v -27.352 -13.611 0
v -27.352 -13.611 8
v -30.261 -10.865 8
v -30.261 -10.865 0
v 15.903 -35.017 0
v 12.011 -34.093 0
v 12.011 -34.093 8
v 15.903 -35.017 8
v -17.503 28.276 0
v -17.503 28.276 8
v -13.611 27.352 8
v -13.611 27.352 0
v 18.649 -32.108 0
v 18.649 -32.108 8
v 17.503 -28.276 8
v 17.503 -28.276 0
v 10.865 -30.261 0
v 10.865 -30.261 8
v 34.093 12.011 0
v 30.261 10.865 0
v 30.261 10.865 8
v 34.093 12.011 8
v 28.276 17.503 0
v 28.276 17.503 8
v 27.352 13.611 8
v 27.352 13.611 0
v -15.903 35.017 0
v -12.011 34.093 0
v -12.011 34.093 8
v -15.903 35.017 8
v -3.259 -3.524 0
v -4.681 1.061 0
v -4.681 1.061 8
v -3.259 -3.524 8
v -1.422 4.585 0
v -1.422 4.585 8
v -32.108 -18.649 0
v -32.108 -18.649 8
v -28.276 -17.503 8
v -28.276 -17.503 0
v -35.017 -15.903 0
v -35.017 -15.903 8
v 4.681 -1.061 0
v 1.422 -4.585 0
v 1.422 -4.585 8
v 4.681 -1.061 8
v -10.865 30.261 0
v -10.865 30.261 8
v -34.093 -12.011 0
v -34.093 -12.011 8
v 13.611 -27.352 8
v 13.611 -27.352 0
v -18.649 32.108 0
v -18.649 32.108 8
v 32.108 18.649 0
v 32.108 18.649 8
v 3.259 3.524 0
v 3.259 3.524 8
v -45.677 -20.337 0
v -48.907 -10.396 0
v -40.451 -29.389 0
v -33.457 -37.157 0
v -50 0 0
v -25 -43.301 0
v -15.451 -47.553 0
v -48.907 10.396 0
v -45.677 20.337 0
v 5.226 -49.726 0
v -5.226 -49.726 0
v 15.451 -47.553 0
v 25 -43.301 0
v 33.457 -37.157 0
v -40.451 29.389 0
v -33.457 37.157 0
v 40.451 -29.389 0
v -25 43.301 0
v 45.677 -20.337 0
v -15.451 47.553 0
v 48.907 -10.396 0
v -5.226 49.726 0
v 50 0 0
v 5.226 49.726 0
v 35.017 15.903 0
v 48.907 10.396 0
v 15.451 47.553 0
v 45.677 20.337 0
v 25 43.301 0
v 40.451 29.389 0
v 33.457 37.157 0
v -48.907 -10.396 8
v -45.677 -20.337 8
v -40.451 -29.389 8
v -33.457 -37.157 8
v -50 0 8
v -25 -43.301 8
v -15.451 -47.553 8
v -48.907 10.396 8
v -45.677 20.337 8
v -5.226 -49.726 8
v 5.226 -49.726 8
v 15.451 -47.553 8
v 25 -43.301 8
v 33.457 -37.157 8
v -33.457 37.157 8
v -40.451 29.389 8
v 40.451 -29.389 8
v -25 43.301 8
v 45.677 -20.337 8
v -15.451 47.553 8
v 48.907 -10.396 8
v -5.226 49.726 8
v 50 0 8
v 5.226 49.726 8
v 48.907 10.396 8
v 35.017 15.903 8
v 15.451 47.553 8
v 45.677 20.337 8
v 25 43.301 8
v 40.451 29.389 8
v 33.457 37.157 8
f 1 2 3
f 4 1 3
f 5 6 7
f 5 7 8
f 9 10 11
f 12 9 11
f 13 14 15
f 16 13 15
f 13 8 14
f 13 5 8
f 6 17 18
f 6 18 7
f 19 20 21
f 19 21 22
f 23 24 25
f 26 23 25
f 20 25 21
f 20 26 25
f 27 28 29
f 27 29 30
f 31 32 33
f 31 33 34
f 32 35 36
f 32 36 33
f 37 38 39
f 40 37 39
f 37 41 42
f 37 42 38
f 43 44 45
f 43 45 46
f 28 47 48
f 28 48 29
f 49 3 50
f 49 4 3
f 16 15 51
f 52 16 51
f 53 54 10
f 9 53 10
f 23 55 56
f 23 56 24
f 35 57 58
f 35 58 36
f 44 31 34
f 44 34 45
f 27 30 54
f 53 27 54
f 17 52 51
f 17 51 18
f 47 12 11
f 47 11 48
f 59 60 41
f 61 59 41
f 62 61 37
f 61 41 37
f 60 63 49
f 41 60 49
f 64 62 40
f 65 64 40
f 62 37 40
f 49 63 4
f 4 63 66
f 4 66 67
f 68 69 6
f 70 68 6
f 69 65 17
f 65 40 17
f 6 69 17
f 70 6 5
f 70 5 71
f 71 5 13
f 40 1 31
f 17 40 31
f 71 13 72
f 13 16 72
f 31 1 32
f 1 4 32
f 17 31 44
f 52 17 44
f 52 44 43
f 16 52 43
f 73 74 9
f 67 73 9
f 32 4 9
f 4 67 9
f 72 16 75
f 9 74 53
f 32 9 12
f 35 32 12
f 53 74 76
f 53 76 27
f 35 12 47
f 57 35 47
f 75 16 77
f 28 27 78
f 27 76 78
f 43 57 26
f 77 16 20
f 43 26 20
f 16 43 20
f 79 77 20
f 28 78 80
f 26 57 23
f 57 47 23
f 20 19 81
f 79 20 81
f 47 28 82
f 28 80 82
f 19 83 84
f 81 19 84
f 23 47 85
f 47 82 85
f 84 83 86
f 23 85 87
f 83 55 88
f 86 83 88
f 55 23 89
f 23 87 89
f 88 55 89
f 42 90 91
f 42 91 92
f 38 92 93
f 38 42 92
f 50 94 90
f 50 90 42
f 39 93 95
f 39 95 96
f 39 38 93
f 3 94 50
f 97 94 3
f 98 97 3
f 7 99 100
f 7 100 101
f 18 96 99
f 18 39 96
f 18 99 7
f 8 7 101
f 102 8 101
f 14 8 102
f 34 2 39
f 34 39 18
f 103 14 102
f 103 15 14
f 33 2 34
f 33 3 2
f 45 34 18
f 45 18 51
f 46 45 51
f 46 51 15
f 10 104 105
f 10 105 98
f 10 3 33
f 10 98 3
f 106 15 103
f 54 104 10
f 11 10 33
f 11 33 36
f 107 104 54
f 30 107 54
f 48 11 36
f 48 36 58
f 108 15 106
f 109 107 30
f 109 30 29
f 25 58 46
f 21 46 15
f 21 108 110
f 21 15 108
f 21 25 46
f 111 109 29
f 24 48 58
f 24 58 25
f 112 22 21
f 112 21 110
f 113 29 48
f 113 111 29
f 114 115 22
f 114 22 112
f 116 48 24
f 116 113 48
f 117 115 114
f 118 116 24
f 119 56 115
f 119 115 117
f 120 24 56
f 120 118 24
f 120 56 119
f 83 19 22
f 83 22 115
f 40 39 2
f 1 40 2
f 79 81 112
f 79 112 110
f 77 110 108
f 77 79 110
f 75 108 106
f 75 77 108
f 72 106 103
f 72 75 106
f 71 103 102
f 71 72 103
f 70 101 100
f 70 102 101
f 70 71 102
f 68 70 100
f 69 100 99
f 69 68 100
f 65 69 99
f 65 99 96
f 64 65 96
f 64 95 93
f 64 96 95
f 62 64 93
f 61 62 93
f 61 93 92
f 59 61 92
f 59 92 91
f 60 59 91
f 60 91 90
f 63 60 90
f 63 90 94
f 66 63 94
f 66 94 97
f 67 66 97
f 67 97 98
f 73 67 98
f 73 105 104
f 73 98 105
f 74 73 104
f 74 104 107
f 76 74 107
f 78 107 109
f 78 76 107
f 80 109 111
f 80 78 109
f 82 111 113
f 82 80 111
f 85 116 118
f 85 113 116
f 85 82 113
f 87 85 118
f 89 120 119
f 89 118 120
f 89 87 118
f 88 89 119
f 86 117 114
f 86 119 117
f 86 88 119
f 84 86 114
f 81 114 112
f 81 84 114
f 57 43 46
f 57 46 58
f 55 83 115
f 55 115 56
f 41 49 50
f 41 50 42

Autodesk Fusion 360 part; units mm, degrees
sketch "mainbase" plane through (0, 0, 0) normal (0, 0, 1) x (1, 0, 0)
  circle A0 centre (0, 0) radius 50
  circle A1 centre (0, 0) radius 46.5
  line L0 (-42.0315, -19.8897) -> (5.9278, -46.1206)
  line L1 (5.9278, -46.1206) -> (45.6951, -8.6144)
  line L2 (45.6951, -8.6144) -> (22.3133, 40.7966)
  line L3 (22.3133, 40.7966) -> (-31.9047, 33.8281)
  line L4 (-31.9047, 33.8281) -> (-42.0315, -19.8897)
  line L5 (-31.9047, 33.8281) -> (0, 0)
  line L6 (0, 0) -> (-42.0315, -19.8897)
  line L7 (5.9278, -46.1206) -> (0, 0)
  line L8 (45.6951, -8.6144) -> (0, 0)
  line L9 (22.3133, 40.7966) -> (0, 0)
  line L10 (-20.0354, 17.8663) -> (-16.8802, 20.3249)
  line L11 (-16.8802, 20.3249) -> (-17.4318, 24.2866)
  line L12 (-17.4318, 24.2866) -> (-21.1386, 25.7899)
  line L13 (-21.1386, 25.7899) -> (-24.2938, 23.3313)
  line L14 (-24.2938, 23.3313) -> (-23.7422, 19.3695)
  line L15 (-23.7422, 19.3695) -> (-20.0354, 17.8663)
  line L16 (19.2822, 26.9195) -> (19.1418, 30.9171)
  line L17 (19.1418, 30.9171) -> (15.6096, 32.7942)
  line L18 (15.6096, 32.7942) -> (12.2178, 30.6738)
  line L19 (12.2178, 30.6738) -> (12.3583, 26.6762)
  line L20 (12.3583, 26.6762) -> (15.8905, 24.7991)
  line L21 (15.8905, 24.7991) -> (19.2822, 26.9195)
  line L22 (30.8937, -9.0267) -> (34.6805, -10.315)
  line L23 (34.6805, -10.315) -> (37.6897, -7.6796)
  line L24 (37.6897, -7.6796) -> (36.912, -3.756)
  line L25 (36.912, -3.756) -> (33.1251, -2.4676)
  line L26 (33.1251, -2.4676) -> (30.116, -5.103)
  line L27 (30.116, -5.103) -> (30.8937, -9.0267)
  line L28 (8.3833, -33.8748) -> (6.093, -30.5954)
  line L29 (6.093, -30.5954) -> (2.1078, -30.9391)
  line L30 (2.1078, -30.9391) -> (0.4128, -34.5622)
  line L31 (0.4128, -34.5622) -> (2.7031, -37.8417)
  line L32 (2.7031, -37.8417) -> (6.6883, -37.498)
  line L33 (6.6883, -37.498) -> (8.3833, -33.8748)
  line L34 (-27.3524, -13.6107) -> (-30.2612, -10.865)
  line L35 (-30.2612, -10.865) -> (-34.0934, -12.0112)
  line L36 (-34.0934, -12.0112) -> (-35.0169, -15.9031)
  line L37 (-35.0169, -15.9031) -> (-32.1082, -18.6488)
  line L38 (-32.1082, -18.6488) -> (-28.2759, -17.5026)
  line L39 (-28.2759, -17.5026) -> (-27.3524, -13.6107)
  line L40 (1.4219, -4.5846) -> (4.6813, -1.0609)
  line L41 (4.6813, -1.0609) -> (3.2594, 3.5237)
  line L42 (3.2594, 3.5237) -> (-1.4219, 4.5846)
  line L43 (-1.4219, 4.5846) -> (-4.6813, 1.0609)
  line L44 (-4.6813, 1.0609) -> (-3.2594, -3.5237)
  line L45 (-3.2594, -3.5237) -> (1.4219, -4.5846)
  point P0 (-20.587, 21.8281)
  point P1 (15.75, 28.7966)
  point P2 (33.9028, -6.3913)
  point P3 (4.3981, -34.2185)
  point P4 (-31.1847, -14.7569)
  dimension "d1" = 100
  dimension "d2" = 93
  dimension "d3" = 46.5
  dimension "d4" = 4
  dimension "d5" = 12
  dimension "d6" = 4
  dimension "d7" = 12
  dimension "d8" = 4
  dimension "d9" = 12
  dimension "d10" = 4
  dimension "d11" = 12
  dimension "d12" = 4
  dimension "d13" = 12
  dimension "d14" = 4.8
extrude "Extrude1" add sketch "mainbase" along normal blind 8 contours A0 | A1 L2 | A1 L3 | L3 L5 L9 L10 L11 L12 L13 L17 L18 L19 L20 L42 L43 | L2 L8 L9 L16 L17 L20 L21 L24 L25 L26 L27 L41 L42 | A1 L1 | L1 L7 L8 L22 L23 L24 L27 L28 L29 L32 L33 L40 L41 L45 | A1 L4 | L4 L5 L6 L10 L13 L14 L15 L34 L35 L36 L37 L43 L44 | L9 L16 L17 L20 L21 | L9 L17 L18 L19 L20 | A1 L0 | L0 L6 L7 L29 L30 L31 L32 L34 L37 L38 L39 L44 L45 | L8 L22 L23 L24 L27 | L8 L24 L25 L26 L27 | L5 L10 L11 L12 L13 | L5 L10 L13 L14 L15 | L7 L29 L30 L31 L32 | L7 L28 L29 L32 L33 | L6 L34 L35 L36 L37 | L6 L34 L37 L38 L39
extrude "Extrude2" cut sketch "mainbase" along normal blind 25 contours L6 L34 L35 L36 L37 | L6 L34 L37 L38 L39
pattern_circular "C-Pattern1" count 4 over 360 about axis through (0, 0, 1.75) along (0, 0, 1) of "Extrude2"
equation "d3 = ( 93 / 2 ) * 1 mm"
